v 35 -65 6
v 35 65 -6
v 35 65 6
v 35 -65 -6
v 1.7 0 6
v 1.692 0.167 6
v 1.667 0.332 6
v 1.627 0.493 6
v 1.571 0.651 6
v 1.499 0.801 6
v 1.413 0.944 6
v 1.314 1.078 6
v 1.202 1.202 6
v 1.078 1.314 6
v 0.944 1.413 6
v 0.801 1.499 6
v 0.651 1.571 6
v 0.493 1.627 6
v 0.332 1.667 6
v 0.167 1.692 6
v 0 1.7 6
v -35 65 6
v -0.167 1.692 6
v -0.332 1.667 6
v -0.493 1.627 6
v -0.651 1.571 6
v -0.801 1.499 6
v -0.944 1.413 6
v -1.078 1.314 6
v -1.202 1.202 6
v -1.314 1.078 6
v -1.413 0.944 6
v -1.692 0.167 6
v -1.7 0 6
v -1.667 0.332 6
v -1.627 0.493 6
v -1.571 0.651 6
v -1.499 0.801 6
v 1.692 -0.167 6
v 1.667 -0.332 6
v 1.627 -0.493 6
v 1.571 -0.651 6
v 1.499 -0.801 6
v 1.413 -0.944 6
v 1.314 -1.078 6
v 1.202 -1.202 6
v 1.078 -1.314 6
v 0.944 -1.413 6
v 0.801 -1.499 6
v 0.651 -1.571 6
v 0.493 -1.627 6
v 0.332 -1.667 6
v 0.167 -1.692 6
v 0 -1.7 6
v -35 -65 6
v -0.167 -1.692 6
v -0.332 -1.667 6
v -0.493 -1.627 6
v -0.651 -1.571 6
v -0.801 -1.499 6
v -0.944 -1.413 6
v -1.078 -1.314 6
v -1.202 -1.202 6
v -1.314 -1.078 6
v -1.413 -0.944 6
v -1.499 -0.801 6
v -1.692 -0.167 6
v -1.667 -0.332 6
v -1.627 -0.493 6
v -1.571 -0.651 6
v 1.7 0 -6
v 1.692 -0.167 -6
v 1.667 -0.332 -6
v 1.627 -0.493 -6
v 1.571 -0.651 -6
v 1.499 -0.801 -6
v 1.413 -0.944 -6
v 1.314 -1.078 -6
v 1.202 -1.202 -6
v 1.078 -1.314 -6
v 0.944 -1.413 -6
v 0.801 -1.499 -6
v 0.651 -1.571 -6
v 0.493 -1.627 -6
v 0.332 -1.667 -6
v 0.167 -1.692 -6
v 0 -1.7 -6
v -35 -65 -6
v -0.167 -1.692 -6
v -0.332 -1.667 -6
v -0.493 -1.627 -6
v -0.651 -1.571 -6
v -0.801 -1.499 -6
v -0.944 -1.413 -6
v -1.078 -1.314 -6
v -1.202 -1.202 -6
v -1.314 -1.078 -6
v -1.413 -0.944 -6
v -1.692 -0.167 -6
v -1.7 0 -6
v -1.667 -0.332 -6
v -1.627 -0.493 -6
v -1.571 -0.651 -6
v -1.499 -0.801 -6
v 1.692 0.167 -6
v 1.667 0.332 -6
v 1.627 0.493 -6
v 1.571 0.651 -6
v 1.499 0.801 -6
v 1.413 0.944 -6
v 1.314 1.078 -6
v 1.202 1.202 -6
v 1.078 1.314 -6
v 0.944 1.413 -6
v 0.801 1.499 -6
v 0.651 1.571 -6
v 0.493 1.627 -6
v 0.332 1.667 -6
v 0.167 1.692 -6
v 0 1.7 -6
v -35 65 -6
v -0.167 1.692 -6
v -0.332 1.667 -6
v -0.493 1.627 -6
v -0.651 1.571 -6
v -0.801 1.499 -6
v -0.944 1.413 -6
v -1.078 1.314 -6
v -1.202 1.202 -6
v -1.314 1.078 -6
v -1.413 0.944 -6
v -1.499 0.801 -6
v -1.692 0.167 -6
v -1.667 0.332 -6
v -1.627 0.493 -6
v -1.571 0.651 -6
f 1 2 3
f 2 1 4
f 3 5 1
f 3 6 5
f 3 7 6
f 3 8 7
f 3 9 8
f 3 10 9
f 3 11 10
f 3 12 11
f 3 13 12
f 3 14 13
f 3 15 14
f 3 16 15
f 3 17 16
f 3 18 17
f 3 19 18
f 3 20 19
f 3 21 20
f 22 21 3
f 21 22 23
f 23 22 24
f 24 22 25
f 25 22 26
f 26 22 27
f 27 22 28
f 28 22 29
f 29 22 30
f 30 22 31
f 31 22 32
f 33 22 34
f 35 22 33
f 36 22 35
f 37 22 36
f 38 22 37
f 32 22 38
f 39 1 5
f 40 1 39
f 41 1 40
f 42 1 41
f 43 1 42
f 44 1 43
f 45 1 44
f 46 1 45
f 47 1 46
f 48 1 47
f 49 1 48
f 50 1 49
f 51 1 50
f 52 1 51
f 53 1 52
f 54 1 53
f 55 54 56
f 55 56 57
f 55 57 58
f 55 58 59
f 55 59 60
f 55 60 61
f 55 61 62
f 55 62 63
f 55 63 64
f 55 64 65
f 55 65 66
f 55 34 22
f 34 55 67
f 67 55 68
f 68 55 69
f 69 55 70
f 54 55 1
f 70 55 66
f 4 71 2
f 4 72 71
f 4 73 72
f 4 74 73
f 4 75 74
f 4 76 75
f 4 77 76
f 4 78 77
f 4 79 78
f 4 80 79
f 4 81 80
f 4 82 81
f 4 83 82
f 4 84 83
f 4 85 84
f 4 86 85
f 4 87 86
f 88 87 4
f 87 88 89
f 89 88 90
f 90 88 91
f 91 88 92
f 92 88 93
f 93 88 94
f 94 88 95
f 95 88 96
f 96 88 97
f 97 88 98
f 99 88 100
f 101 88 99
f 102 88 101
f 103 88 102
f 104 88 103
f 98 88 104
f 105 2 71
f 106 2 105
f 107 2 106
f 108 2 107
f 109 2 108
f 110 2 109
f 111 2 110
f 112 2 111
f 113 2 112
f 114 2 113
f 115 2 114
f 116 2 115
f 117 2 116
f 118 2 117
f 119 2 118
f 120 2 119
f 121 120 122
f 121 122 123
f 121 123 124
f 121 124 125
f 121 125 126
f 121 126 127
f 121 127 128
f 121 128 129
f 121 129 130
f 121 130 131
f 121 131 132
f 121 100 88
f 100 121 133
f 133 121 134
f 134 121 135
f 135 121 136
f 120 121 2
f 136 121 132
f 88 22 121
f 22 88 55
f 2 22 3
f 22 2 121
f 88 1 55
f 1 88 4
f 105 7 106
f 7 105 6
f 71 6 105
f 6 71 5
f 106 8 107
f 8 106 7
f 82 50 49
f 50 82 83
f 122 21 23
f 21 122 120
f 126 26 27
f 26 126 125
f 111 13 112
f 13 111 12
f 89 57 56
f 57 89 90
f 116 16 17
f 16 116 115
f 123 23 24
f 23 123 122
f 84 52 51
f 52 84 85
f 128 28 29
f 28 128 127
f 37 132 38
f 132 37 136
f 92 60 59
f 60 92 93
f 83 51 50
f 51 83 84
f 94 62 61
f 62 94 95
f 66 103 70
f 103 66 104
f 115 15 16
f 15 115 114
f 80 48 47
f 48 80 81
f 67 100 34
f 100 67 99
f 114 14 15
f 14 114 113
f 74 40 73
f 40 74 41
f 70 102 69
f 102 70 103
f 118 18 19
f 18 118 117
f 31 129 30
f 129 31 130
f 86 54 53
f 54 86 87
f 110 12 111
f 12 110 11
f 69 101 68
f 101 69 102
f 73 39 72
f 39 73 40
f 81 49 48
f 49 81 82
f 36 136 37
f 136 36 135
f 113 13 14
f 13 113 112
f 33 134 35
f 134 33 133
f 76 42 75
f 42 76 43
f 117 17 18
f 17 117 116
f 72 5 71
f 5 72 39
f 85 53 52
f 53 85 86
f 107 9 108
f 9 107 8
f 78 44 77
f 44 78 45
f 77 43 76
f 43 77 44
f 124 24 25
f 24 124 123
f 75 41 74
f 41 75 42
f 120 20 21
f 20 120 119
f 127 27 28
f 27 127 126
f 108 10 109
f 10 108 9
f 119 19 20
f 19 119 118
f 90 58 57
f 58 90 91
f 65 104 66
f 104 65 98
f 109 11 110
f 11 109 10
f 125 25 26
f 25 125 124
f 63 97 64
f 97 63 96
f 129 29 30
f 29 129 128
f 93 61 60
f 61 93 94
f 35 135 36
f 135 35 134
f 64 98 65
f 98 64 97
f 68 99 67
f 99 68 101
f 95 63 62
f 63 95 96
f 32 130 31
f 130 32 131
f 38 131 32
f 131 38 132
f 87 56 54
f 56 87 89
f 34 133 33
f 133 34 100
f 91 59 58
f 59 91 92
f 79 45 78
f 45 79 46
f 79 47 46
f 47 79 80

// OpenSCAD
render_fn = 64;
$fn = render_fn;
set = "__CLAW_MODEL__"; // [__CLAW_MODEL__, assembly]

part_w = 70;
part_d = 130;
part_h = 12;
boolean_overlap = 0.1;

module __CLAW_MODEL___positive() {
    cube([part_w, part_d, part_h], center = true);
}

module __CLAW_MODEL___negative() {
    echo("BOM", "M3x16 screw", 1);
    cylinder(d = 3.4, h = part_h + 2 * boolean_overlap, center = true);
}

module __CLAW_MODEL__() {
    difference() {
        __CLAW_MODEL___positive();
        __CLAW_MODEL___negative();
    }
}

if (set == "__CLAW_MODEL__") {
    __CLAW_MODEL__();
} else if (set == "assembly") {
    __CLAW_MODEL__();
}
